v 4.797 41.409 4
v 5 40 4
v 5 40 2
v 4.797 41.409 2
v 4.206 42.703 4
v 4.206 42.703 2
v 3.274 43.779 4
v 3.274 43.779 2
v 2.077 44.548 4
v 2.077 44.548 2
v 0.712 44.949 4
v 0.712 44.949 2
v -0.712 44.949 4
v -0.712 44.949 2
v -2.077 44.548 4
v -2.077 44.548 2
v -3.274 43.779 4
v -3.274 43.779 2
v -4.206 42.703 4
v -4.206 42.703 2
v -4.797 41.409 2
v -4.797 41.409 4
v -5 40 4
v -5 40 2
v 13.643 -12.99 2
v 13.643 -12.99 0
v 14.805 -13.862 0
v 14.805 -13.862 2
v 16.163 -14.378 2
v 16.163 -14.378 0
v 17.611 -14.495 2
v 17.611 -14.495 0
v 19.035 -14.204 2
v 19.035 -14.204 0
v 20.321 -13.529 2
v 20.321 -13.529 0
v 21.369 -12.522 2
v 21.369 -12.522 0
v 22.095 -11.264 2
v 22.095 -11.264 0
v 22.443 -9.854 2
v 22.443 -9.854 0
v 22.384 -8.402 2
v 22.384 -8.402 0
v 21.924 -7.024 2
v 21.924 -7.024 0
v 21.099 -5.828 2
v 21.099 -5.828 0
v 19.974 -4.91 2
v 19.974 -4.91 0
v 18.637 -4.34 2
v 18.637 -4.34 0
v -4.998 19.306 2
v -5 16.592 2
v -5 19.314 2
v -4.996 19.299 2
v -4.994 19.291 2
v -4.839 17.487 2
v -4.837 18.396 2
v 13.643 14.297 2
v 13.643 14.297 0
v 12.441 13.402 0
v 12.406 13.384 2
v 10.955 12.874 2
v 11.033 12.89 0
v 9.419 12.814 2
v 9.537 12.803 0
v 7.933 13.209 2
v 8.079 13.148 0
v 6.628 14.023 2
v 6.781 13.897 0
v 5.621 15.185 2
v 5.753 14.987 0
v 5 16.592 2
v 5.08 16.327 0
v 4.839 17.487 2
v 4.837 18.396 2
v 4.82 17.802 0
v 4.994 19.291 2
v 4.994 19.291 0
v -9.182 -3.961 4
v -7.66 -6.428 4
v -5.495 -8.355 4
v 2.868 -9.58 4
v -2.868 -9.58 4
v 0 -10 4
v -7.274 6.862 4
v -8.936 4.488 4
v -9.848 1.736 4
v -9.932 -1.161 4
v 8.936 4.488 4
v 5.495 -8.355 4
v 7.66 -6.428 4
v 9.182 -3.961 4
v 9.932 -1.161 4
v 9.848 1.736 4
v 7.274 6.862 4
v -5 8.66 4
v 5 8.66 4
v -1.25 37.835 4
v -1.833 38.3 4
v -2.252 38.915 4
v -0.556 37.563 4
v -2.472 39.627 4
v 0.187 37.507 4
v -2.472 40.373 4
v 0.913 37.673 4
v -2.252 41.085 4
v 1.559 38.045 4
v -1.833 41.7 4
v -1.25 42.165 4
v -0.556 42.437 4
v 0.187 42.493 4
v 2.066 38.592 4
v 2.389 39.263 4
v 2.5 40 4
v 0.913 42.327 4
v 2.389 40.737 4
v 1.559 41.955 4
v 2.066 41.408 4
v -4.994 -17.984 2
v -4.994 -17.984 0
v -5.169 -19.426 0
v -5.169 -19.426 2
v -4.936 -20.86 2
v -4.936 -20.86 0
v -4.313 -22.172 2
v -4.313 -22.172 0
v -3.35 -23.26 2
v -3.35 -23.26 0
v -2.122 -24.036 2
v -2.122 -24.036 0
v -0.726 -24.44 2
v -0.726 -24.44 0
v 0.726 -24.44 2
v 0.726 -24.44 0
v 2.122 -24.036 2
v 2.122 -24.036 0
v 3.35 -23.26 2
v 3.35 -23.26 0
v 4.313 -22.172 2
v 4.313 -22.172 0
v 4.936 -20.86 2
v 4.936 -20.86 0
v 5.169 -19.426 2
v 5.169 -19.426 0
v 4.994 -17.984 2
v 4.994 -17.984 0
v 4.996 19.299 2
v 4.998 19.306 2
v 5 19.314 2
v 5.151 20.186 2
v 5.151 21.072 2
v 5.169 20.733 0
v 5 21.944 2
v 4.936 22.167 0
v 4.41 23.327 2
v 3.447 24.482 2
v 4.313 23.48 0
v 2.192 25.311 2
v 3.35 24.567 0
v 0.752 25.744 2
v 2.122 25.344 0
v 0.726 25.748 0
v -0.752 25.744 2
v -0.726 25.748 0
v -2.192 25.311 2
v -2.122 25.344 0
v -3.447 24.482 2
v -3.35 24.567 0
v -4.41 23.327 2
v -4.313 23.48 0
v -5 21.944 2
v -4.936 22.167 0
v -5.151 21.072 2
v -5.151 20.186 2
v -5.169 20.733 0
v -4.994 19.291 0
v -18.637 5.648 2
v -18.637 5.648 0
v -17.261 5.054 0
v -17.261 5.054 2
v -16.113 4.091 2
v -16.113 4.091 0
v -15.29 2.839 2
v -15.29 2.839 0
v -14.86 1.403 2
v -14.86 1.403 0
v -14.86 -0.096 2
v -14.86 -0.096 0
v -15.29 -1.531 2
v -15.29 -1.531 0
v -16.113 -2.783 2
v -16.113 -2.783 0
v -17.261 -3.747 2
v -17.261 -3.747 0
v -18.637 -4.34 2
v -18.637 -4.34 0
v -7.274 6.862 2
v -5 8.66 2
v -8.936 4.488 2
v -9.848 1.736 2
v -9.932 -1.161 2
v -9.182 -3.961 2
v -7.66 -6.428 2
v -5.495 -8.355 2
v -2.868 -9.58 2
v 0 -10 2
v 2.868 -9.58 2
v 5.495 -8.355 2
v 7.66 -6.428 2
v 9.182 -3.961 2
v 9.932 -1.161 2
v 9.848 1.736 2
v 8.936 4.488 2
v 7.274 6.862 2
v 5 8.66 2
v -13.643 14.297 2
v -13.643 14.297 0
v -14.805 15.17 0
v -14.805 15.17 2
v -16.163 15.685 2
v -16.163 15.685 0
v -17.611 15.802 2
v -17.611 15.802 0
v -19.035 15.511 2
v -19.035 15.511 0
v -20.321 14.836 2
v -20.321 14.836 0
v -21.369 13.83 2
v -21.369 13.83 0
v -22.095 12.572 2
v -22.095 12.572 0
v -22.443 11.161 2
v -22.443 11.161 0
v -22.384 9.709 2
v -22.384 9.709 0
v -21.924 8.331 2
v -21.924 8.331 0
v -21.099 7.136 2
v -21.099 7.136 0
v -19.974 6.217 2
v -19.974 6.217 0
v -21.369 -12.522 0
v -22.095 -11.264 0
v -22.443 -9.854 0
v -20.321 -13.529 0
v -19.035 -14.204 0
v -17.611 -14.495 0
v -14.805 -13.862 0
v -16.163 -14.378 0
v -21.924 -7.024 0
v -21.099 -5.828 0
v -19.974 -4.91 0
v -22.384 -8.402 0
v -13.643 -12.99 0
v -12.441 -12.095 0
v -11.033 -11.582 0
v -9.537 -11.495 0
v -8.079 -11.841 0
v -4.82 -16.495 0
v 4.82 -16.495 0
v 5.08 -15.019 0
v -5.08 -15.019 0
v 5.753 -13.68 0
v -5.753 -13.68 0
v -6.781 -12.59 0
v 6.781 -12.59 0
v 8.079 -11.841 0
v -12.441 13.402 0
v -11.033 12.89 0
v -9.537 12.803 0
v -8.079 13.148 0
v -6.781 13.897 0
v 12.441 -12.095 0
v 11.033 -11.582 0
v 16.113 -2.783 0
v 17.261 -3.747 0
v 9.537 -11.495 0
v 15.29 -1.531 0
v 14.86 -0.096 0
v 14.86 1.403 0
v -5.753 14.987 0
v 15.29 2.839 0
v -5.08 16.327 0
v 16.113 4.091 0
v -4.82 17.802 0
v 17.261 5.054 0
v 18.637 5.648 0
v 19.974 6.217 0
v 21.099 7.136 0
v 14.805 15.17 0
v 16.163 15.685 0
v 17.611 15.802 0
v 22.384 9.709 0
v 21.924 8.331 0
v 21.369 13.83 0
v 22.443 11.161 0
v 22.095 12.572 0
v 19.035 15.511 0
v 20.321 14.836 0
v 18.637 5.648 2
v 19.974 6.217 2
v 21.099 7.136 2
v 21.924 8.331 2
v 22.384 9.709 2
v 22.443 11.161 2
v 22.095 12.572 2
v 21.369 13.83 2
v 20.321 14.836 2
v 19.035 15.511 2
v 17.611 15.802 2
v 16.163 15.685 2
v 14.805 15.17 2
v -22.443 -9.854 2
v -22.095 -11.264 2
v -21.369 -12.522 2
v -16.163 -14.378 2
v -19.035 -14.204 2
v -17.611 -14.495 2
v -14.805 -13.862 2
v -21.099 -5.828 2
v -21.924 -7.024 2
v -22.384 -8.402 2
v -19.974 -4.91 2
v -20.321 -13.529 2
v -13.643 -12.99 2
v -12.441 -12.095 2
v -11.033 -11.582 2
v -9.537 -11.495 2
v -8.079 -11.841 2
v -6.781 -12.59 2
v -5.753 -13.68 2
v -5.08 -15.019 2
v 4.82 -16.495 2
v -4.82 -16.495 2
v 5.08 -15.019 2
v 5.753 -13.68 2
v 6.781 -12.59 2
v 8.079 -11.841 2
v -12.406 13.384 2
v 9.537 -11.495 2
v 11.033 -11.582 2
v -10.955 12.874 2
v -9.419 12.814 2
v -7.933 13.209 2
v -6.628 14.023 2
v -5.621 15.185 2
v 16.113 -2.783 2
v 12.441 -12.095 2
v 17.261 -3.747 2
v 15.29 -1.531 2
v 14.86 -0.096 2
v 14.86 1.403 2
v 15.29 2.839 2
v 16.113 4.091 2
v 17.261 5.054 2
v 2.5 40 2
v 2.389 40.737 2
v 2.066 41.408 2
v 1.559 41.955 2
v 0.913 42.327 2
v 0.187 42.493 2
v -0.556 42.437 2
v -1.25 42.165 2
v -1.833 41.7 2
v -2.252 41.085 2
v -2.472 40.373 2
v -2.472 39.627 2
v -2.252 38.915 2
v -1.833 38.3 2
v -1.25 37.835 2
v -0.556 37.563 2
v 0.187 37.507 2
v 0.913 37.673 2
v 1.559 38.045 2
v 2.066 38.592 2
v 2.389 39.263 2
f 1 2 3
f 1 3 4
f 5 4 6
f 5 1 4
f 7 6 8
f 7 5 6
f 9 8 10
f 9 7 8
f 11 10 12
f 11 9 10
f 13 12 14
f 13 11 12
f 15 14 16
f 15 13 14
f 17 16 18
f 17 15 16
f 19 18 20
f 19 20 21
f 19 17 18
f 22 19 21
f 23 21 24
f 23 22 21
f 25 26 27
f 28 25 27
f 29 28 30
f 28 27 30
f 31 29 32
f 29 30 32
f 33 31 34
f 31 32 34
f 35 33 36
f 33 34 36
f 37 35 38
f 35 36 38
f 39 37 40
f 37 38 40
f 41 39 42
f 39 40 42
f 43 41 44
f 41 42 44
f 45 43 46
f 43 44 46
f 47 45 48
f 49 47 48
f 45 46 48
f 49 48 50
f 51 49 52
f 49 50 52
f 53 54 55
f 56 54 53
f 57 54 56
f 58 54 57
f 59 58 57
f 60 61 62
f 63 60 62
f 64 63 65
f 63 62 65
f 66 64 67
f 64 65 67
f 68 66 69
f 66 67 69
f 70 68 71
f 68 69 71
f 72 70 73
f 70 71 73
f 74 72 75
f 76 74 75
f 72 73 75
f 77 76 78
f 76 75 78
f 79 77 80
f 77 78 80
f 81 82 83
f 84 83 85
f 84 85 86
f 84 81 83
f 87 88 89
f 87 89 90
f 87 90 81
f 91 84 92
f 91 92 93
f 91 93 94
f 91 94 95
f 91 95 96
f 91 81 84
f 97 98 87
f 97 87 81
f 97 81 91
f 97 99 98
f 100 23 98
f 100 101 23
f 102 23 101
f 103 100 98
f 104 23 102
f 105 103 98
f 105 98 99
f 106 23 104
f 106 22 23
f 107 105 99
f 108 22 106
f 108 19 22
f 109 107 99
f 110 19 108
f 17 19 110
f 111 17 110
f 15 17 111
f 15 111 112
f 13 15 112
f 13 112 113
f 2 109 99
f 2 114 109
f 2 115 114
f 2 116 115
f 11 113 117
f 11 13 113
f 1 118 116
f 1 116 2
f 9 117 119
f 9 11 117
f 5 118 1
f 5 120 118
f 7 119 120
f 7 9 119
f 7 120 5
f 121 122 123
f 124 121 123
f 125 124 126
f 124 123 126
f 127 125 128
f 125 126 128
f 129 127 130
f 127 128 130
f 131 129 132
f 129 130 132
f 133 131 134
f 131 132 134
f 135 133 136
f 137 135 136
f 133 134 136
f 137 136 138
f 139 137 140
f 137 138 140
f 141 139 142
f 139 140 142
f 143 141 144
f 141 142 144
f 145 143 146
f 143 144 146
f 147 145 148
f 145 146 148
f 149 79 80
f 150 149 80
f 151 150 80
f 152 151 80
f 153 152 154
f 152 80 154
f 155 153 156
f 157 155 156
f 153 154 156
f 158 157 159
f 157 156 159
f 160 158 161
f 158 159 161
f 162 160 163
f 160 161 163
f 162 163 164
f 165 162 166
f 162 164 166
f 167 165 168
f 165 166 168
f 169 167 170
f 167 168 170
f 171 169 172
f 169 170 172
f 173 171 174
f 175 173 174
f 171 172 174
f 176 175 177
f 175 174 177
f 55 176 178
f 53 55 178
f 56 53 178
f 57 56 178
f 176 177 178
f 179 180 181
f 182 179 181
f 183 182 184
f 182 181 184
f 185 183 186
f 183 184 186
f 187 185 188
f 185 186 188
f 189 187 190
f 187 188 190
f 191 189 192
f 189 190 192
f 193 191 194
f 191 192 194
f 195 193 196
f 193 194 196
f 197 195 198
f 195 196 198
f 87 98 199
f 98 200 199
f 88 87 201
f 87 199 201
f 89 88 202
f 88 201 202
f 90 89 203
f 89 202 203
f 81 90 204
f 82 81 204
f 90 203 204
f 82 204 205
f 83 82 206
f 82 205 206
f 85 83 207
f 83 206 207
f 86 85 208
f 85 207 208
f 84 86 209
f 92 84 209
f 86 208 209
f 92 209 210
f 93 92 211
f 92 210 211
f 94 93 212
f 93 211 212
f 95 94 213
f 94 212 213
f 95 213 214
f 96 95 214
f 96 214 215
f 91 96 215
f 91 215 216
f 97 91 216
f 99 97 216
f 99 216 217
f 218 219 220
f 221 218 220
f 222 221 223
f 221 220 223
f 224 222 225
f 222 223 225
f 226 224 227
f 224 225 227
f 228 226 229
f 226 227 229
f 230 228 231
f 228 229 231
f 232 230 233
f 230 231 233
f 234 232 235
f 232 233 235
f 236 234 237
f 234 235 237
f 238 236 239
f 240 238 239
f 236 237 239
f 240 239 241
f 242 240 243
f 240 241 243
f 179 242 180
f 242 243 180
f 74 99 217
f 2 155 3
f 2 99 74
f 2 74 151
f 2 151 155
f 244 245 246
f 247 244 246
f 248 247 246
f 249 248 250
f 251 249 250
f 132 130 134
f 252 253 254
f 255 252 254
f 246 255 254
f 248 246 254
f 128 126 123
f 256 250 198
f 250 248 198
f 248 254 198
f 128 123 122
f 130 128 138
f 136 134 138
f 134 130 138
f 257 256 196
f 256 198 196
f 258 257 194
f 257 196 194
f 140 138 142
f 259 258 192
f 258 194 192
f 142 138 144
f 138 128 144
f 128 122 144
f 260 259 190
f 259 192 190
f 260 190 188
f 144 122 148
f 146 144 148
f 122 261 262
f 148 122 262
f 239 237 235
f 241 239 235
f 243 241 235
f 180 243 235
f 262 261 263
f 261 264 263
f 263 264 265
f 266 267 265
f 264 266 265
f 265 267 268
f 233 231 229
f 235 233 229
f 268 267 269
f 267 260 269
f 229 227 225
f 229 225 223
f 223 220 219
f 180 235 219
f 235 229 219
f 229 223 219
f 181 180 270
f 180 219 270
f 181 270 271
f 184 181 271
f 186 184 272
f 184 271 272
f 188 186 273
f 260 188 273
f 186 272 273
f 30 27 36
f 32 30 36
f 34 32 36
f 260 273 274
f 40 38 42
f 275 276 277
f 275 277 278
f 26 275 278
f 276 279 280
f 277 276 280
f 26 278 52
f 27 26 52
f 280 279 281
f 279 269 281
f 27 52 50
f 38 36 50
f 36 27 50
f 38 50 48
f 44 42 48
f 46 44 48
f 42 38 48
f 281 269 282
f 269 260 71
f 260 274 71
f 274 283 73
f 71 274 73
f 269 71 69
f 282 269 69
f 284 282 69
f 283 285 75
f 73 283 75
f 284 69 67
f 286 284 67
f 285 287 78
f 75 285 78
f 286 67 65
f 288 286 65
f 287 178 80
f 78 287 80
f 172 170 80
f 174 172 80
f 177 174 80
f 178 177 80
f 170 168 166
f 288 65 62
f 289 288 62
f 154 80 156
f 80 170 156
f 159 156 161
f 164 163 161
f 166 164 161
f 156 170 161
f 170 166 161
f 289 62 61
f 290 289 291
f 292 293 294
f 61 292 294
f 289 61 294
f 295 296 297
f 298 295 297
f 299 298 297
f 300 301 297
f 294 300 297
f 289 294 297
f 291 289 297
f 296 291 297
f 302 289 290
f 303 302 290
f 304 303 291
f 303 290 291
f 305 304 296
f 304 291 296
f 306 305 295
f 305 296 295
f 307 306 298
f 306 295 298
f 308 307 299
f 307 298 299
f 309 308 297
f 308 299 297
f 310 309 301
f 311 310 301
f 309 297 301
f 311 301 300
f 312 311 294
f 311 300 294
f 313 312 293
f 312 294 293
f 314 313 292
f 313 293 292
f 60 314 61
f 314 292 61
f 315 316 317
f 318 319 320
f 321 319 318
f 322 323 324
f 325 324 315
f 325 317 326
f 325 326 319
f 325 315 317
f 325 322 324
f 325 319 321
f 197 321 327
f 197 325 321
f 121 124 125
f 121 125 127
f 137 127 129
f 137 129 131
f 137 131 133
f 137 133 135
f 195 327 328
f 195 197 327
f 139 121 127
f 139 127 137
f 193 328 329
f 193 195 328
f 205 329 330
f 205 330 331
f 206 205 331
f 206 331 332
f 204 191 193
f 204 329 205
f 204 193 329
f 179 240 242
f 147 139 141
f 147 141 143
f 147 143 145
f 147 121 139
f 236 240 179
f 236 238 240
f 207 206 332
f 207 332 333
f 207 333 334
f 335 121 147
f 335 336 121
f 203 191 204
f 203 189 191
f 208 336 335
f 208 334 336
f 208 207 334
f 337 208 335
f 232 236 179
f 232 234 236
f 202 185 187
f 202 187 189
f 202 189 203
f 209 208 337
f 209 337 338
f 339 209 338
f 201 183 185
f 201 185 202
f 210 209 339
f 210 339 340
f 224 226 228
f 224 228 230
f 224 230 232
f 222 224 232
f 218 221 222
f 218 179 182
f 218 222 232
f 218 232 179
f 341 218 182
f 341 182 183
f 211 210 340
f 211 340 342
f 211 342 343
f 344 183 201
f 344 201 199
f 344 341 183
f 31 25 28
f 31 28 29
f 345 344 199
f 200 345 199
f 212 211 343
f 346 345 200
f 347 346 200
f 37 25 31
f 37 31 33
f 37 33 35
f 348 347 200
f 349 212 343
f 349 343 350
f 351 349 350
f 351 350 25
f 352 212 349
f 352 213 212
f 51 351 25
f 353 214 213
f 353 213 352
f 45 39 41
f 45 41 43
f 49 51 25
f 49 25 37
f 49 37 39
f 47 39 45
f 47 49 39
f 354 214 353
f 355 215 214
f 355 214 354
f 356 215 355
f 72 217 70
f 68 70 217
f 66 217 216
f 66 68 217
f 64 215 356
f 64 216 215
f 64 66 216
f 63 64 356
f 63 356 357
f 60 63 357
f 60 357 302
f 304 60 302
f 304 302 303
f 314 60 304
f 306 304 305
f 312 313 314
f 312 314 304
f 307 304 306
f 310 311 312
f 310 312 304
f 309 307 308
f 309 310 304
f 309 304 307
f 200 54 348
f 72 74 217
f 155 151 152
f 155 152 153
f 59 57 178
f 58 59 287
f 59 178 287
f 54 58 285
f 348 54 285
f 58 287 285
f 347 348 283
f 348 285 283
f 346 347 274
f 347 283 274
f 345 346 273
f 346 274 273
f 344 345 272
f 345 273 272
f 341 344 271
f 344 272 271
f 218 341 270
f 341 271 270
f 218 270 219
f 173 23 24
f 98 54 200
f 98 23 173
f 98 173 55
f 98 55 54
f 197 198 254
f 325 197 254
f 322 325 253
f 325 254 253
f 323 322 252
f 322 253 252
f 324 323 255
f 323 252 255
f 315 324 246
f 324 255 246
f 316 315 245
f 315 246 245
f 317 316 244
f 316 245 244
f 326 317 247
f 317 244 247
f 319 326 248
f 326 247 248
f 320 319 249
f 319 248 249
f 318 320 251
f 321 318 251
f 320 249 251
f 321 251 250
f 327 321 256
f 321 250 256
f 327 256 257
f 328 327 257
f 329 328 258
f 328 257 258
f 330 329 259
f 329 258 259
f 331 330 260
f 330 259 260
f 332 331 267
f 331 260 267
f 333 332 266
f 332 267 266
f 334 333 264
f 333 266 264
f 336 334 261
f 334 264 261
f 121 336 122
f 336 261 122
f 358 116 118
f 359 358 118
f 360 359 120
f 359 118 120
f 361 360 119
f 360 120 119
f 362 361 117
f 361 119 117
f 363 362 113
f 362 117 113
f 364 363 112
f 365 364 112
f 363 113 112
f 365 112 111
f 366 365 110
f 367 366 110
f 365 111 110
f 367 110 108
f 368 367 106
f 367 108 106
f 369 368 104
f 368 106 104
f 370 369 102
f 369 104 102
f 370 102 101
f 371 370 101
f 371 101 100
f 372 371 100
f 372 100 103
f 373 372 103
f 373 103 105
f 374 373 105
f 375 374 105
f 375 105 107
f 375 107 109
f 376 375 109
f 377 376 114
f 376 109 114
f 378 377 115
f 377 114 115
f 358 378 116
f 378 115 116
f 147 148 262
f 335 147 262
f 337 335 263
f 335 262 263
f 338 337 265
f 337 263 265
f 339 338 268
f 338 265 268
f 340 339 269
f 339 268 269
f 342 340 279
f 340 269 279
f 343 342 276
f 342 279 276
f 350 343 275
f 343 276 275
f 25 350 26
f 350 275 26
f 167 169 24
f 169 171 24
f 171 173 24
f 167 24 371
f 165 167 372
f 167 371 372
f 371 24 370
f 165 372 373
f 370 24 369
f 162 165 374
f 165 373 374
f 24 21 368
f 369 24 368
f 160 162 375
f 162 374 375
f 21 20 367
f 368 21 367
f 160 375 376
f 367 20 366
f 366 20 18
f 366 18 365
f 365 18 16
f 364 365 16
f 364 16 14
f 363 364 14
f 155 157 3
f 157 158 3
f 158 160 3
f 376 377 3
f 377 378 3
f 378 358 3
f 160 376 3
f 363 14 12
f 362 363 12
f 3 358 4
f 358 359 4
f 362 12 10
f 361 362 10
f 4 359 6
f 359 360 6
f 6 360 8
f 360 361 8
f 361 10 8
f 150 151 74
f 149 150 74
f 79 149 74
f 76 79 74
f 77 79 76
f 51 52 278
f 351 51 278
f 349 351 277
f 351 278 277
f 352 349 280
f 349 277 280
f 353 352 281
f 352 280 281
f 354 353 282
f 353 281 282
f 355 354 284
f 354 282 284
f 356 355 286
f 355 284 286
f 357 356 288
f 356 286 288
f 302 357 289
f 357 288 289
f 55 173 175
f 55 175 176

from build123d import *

# Parameters (mm, degrees)
F1_DEPTH = 2
F2_R     = 10
F3_DEPTH = 2
F4_R     = 2.5
F5_DEPTH = 2


with BuildPart() as f1:
    # F0 (on Top) → F1 (new body)
    with BuildSketch(Plane.XY):
        with BuildLine():
            ThreePointArc((-4.993837, 19.290927), (-7.402673, 13.475481), (-13.643415, 14.297091))
            ThreePointArc((-13.643415, 14.297091), (-21.776508, 13.226349), (-18.637252, 5.647512))
            ThreePointArc((-18.637252, 5.647512), (-14.805346, 0.653676), (-18.637252, -4.340161))
            ThreePointArc((-18.637252, -4.340161), (-21.776508, -11.918997), (-13.643415, -12.989739))
            ThreePointArc((-13.643415, -12.989739), (-7.402673, -12.16813), (-4.993837, -17.983576))
            ThreePointArc((-4.993837, -17.983576), (0, -24.49167), (4.993837, -17.983576))
            ThreePointArc((4.993837, -17.983576), (7.402673, -12.16813), (13.643415, -12.989739))
            ThreePointArc((13.643415, -12.989739), (21.776508, -11.918997), (18.637252, -4.340161))
            ThreePointArc((18.637252, -4.340161), (14.805346, 0.653676), (18.637252, 5.647512))
            ThreePointArc((18.637252, 5.647512), (21.776508, 13.226349), (13.643415, 14.297091))
            ThreePointArc((13.643415, 14.297091), (7.402673, 13.475481), (4.993837, 19.290927))
            ThreePointArc((4.993837, 19.290927), (0, 25.799022), (-4.993837, 19.290927))
        make_face()
    extrude(amount=F1_DEPTH)

    # F2 (on face) → F3 (join)
    with BuildSketch(Plane.XY.offset(2)):
        Circle(F2_R)
    extrude(amount=F3_DEPTH)

    # F4 (on face) → F5 (join)
    with BuildSketch(Plane.XY.offset(4)):
        with BuildLine():
            Line((-5, 0), (0, 0))
            Line((0, 0), (5, 0))
            Line((5, 0), (5, 40))
            ThreePointArc((5, 40), (0, 45), (-5, 40))
            Line((-5, 40), (-5, 0))
        make_face()
        with Locations((0, 40)):
            Circle(F4_R, mode=Mode.SUBTRACT)
    extrude(amount=-F5_DEPTH)


solid = f1.part
